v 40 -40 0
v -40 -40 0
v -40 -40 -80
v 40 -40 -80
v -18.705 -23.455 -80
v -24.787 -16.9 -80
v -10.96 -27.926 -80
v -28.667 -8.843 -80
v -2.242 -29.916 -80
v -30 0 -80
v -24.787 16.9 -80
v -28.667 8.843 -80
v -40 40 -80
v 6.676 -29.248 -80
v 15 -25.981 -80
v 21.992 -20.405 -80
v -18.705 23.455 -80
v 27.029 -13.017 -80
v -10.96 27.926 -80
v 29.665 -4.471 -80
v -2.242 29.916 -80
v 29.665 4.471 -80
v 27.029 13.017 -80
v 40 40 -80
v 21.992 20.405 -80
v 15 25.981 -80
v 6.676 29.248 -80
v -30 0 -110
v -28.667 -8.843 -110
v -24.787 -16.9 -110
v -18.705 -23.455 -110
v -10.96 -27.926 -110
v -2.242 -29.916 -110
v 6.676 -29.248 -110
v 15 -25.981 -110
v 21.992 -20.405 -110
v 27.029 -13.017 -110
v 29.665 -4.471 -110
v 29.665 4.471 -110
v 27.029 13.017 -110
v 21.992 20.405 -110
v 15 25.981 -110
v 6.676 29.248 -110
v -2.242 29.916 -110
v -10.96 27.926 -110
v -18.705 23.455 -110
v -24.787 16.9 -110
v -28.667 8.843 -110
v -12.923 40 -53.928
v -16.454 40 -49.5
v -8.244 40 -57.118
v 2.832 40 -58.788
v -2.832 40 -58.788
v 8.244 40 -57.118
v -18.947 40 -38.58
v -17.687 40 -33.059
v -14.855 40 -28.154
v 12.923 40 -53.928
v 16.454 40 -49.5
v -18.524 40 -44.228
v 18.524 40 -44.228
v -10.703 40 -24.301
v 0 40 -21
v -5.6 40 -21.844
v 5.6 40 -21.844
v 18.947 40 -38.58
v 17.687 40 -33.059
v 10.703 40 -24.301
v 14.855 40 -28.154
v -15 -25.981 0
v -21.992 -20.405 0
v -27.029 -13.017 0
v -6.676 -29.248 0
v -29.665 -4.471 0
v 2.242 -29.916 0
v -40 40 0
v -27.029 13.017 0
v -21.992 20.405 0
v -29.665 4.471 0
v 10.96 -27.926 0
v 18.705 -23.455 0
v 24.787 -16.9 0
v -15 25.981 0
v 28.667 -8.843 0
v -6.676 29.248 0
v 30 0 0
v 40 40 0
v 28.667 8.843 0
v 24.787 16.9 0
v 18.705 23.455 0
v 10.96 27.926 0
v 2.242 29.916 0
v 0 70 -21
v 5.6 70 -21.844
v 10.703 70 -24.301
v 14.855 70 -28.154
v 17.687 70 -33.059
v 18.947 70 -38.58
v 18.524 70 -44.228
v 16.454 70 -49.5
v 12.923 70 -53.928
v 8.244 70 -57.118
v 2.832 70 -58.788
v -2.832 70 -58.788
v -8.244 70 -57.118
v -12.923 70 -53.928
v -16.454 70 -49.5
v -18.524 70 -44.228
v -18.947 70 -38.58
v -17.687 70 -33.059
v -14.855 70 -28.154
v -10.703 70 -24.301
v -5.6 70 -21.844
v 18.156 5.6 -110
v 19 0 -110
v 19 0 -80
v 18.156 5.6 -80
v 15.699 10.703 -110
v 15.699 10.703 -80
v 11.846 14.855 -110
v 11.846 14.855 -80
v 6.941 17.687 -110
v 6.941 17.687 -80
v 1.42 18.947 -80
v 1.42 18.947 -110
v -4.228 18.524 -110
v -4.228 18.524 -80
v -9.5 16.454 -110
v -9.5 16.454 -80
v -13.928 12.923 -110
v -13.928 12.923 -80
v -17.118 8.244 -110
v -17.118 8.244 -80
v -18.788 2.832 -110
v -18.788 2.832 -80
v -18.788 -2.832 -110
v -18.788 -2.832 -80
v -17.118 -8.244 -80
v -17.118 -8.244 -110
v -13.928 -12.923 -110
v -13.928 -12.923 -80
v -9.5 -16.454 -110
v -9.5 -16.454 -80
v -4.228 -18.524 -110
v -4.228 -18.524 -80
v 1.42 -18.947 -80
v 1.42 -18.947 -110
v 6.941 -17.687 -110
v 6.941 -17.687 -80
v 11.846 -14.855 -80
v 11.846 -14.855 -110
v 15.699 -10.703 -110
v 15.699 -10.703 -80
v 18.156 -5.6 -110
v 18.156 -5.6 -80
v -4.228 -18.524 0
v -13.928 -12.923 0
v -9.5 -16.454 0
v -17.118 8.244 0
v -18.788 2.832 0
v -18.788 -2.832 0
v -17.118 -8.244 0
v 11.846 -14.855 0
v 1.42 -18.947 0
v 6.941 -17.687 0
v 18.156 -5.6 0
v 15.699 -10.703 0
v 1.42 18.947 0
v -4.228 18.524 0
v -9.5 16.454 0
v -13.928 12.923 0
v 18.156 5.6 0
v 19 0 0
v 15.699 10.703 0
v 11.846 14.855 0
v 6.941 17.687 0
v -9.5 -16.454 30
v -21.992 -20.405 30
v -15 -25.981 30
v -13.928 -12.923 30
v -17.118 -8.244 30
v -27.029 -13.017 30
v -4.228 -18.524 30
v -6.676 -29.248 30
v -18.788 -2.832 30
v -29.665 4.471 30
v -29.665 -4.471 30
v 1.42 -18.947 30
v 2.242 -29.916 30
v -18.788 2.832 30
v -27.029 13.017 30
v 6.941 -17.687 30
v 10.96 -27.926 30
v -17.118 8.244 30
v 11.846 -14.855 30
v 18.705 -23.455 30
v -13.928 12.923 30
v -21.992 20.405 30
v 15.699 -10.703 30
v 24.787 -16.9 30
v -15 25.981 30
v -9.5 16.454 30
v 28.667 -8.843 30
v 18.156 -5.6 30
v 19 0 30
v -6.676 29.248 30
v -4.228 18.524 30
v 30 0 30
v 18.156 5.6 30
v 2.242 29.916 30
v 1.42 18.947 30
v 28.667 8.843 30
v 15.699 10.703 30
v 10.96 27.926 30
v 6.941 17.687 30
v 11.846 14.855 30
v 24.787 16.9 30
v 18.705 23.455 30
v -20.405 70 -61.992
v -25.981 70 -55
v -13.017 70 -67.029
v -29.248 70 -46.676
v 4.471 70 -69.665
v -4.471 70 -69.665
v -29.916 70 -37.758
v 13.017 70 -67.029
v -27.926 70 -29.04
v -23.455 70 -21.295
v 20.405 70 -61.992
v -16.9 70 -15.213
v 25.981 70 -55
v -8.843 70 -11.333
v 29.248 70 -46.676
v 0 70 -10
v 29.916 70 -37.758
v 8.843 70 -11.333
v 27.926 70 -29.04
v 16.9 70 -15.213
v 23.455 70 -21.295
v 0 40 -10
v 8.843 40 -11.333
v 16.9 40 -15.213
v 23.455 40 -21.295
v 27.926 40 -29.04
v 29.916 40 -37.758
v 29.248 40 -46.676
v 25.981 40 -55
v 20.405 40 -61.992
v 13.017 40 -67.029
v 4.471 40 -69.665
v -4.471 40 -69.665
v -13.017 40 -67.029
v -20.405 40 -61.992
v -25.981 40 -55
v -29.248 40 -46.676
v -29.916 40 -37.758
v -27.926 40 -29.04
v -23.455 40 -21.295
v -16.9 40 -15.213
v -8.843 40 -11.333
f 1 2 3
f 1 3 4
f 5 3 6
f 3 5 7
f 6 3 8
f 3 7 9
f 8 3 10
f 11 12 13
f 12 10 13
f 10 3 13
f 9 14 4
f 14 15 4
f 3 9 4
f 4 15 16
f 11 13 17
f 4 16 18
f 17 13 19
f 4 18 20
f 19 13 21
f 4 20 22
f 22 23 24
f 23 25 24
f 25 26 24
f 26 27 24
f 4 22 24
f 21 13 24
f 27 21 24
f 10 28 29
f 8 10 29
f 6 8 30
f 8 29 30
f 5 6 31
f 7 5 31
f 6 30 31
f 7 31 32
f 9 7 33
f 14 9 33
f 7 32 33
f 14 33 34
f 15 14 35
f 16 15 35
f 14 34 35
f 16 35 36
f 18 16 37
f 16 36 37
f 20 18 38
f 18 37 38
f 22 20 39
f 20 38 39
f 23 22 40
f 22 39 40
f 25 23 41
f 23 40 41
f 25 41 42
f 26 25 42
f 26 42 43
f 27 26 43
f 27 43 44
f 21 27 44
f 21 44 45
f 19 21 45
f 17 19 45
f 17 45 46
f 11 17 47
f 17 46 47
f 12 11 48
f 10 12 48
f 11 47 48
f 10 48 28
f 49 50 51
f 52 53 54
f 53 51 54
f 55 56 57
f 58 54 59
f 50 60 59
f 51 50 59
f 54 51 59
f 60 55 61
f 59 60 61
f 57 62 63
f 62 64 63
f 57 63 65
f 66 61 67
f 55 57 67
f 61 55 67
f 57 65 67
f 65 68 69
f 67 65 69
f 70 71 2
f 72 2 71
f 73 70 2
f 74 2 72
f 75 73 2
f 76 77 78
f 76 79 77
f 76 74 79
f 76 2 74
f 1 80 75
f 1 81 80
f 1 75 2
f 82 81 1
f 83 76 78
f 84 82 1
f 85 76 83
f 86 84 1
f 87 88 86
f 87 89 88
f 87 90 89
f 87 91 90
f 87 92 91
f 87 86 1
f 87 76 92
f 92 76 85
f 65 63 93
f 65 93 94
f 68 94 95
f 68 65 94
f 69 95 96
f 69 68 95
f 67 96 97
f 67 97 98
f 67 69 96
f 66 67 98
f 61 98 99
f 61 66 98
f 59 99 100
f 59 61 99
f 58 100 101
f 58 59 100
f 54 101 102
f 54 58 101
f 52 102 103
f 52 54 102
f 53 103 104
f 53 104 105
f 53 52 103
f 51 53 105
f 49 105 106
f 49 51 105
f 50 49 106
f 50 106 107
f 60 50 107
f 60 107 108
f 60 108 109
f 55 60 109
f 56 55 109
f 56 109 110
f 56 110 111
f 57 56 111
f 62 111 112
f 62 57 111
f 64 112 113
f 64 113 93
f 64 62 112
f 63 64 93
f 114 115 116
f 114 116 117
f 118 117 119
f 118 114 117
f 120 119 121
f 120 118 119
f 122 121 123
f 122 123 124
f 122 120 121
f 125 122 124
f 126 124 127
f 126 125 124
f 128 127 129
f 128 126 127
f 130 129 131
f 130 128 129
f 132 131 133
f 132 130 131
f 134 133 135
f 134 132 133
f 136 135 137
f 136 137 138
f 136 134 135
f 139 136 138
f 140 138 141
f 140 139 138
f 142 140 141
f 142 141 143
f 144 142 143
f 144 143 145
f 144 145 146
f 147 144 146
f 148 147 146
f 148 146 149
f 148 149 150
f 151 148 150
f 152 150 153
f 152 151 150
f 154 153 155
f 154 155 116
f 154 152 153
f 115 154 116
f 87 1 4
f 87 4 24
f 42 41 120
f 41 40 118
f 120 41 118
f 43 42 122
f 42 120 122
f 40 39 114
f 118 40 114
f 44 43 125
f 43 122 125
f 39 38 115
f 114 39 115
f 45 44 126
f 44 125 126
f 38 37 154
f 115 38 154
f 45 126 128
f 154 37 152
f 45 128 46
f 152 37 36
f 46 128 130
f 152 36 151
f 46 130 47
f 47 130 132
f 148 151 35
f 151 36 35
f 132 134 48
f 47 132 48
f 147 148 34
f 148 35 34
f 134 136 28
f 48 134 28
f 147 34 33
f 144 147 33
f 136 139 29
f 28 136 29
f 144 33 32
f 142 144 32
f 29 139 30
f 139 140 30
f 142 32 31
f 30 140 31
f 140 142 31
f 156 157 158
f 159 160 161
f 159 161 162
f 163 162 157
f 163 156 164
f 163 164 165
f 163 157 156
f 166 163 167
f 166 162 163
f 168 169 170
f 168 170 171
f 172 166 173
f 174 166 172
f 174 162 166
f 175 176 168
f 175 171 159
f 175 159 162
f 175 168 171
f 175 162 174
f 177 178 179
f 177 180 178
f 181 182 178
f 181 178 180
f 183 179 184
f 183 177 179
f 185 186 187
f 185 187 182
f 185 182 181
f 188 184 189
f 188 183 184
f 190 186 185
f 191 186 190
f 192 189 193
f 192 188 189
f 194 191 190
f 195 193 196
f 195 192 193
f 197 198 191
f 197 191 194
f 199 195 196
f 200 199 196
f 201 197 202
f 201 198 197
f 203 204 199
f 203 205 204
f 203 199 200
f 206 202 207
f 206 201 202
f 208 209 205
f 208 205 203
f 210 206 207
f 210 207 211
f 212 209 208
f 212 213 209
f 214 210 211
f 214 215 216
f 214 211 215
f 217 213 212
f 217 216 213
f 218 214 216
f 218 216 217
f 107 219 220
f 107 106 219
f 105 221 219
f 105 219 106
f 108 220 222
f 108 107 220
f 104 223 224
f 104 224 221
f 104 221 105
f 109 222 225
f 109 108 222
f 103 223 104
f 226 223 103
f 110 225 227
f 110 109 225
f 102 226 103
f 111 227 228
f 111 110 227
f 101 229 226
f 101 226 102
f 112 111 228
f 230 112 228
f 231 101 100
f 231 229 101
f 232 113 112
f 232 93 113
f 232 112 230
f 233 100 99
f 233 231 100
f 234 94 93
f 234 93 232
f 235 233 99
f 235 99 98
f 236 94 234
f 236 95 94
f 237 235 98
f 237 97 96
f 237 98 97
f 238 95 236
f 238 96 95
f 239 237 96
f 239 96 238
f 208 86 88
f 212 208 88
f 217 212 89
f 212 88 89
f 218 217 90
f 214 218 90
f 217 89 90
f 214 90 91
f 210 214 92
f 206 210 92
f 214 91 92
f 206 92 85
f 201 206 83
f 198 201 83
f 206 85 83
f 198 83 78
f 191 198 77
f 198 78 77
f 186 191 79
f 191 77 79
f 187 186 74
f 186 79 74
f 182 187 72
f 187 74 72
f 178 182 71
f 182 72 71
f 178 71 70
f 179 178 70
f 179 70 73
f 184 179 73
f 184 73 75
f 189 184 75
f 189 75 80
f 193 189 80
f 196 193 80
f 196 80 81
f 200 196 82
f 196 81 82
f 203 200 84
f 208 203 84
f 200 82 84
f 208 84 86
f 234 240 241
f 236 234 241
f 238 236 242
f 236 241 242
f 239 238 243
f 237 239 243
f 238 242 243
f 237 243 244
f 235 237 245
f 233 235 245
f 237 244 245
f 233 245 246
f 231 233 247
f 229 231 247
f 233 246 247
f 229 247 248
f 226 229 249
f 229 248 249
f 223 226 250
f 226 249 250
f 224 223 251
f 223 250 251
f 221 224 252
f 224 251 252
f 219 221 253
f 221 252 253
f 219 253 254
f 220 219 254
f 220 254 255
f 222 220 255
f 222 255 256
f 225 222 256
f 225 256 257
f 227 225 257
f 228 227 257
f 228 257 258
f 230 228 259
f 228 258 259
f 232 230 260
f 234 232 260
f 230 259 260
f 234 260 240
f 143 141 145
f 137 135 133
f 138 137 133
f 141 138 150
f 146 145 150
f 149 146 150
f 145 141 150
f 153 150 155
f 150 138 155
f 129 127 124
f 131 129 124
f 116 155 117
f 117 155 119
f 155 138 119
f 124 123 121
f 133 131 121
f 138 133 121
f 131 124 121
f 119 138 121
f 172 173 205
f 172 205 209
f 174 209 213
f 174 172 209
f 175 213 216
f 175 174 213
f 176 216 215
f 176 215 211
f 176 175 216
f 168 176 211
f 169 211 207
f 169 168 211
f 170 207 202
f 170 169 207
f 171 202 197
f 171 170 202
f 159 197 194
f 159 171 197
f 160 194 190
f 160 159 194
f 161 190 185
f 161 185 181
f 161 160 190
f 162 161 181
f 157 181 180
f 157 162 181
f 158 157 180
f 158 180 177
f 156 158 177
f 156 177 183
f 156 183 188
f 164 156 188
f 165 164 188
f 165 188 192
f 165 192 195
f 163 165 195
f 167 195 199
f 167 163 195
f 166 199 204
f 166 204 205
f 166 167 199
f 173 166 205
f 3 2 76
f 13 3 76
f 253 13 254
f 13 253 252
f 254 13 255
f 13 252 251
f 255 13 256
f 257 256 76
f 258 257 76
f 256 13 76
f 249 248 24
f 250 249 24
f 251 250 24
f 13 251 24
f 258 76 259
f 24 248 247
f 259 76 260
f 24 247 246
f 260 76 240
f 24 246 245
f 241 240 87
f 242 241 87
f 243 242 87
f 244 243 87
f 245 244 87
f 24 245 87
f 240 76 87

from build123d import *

# Parameters (mm, degrees)
CROQUIS1_R              = 30
CROQUIS1_R_2            = 19
SALIENTE_EXTRUIR1_DEPTH = 30
CROQUIS2_W              = 80
CROQUIS2_H              = 80
SALIENTE_EXTRUIR2_DEPTH = 80
CROQUIS4_R              = 30
CROQUIS4_R_2            = 19
SALIENTE_EXTRUIR4_DEPTH = 30
SALIENTE_EXTRUIR6_START = -30
CROQUIS6_R              = 30
CROQUIS6_R_2            = 19
SALIENTE_EXTRUIR6_DEPTH = 30


with BuildPart() as part:
    # Croquis1 → Saliente-Extruir1 (new body)
    with BuildSketch(Plane.XY):
        Circle(CROQUIS1_R)
        Circle(CROQUIS1_R_2, mode=Mode.SUBTRACT)
    extrude(amount=SALIENTE_EXTRUIR1_DEPTH)

    # Croquis2 → Saliente-Extruir2 (add)
    with BuildSketch(Plane.XY):
        Rectangle(CROQUIS2_W, CROQUIS2_H)
    extrude(amount=-SALIENTE_EXTRUIR2_DEPTH)

    # Croquis4 → Saliente-Extruir4 (add)
    with BuildSketch(Plane(origin=(0, 40, 0), x_dir=(1, 0, 0), z_dir=(0, 1, 0))):
        with Locations(Location((0, 40, 0), (0, 0, 270))):
            Circle(CROQUIS4_R)
        with Locations(Location((0, 40, 0), (0, 0, 270))):
            Circle(CROQUIS4_R_2, mode=Mode.SUBTRACT)
    extrude(amount=SALIENTE_EXTRUIR4_DEPTH)

    # Croquis6 → Saliente-Extruir6 (add)
    with BuildSketch(Plane.XY.offset(-80).offset(SALIENTE_EXTRUIR6_START)):
        with Locations(Location((0, 0, 0), (0, 0, 180))):
            Circle(CROQUIS6_R)
        Circle(CROQUIS6_R_2, mode=Mode.SUBTRACT)
    extrude(amount=SALIENTE_EXTRUIR6_DEPTH)


solid = part.part
